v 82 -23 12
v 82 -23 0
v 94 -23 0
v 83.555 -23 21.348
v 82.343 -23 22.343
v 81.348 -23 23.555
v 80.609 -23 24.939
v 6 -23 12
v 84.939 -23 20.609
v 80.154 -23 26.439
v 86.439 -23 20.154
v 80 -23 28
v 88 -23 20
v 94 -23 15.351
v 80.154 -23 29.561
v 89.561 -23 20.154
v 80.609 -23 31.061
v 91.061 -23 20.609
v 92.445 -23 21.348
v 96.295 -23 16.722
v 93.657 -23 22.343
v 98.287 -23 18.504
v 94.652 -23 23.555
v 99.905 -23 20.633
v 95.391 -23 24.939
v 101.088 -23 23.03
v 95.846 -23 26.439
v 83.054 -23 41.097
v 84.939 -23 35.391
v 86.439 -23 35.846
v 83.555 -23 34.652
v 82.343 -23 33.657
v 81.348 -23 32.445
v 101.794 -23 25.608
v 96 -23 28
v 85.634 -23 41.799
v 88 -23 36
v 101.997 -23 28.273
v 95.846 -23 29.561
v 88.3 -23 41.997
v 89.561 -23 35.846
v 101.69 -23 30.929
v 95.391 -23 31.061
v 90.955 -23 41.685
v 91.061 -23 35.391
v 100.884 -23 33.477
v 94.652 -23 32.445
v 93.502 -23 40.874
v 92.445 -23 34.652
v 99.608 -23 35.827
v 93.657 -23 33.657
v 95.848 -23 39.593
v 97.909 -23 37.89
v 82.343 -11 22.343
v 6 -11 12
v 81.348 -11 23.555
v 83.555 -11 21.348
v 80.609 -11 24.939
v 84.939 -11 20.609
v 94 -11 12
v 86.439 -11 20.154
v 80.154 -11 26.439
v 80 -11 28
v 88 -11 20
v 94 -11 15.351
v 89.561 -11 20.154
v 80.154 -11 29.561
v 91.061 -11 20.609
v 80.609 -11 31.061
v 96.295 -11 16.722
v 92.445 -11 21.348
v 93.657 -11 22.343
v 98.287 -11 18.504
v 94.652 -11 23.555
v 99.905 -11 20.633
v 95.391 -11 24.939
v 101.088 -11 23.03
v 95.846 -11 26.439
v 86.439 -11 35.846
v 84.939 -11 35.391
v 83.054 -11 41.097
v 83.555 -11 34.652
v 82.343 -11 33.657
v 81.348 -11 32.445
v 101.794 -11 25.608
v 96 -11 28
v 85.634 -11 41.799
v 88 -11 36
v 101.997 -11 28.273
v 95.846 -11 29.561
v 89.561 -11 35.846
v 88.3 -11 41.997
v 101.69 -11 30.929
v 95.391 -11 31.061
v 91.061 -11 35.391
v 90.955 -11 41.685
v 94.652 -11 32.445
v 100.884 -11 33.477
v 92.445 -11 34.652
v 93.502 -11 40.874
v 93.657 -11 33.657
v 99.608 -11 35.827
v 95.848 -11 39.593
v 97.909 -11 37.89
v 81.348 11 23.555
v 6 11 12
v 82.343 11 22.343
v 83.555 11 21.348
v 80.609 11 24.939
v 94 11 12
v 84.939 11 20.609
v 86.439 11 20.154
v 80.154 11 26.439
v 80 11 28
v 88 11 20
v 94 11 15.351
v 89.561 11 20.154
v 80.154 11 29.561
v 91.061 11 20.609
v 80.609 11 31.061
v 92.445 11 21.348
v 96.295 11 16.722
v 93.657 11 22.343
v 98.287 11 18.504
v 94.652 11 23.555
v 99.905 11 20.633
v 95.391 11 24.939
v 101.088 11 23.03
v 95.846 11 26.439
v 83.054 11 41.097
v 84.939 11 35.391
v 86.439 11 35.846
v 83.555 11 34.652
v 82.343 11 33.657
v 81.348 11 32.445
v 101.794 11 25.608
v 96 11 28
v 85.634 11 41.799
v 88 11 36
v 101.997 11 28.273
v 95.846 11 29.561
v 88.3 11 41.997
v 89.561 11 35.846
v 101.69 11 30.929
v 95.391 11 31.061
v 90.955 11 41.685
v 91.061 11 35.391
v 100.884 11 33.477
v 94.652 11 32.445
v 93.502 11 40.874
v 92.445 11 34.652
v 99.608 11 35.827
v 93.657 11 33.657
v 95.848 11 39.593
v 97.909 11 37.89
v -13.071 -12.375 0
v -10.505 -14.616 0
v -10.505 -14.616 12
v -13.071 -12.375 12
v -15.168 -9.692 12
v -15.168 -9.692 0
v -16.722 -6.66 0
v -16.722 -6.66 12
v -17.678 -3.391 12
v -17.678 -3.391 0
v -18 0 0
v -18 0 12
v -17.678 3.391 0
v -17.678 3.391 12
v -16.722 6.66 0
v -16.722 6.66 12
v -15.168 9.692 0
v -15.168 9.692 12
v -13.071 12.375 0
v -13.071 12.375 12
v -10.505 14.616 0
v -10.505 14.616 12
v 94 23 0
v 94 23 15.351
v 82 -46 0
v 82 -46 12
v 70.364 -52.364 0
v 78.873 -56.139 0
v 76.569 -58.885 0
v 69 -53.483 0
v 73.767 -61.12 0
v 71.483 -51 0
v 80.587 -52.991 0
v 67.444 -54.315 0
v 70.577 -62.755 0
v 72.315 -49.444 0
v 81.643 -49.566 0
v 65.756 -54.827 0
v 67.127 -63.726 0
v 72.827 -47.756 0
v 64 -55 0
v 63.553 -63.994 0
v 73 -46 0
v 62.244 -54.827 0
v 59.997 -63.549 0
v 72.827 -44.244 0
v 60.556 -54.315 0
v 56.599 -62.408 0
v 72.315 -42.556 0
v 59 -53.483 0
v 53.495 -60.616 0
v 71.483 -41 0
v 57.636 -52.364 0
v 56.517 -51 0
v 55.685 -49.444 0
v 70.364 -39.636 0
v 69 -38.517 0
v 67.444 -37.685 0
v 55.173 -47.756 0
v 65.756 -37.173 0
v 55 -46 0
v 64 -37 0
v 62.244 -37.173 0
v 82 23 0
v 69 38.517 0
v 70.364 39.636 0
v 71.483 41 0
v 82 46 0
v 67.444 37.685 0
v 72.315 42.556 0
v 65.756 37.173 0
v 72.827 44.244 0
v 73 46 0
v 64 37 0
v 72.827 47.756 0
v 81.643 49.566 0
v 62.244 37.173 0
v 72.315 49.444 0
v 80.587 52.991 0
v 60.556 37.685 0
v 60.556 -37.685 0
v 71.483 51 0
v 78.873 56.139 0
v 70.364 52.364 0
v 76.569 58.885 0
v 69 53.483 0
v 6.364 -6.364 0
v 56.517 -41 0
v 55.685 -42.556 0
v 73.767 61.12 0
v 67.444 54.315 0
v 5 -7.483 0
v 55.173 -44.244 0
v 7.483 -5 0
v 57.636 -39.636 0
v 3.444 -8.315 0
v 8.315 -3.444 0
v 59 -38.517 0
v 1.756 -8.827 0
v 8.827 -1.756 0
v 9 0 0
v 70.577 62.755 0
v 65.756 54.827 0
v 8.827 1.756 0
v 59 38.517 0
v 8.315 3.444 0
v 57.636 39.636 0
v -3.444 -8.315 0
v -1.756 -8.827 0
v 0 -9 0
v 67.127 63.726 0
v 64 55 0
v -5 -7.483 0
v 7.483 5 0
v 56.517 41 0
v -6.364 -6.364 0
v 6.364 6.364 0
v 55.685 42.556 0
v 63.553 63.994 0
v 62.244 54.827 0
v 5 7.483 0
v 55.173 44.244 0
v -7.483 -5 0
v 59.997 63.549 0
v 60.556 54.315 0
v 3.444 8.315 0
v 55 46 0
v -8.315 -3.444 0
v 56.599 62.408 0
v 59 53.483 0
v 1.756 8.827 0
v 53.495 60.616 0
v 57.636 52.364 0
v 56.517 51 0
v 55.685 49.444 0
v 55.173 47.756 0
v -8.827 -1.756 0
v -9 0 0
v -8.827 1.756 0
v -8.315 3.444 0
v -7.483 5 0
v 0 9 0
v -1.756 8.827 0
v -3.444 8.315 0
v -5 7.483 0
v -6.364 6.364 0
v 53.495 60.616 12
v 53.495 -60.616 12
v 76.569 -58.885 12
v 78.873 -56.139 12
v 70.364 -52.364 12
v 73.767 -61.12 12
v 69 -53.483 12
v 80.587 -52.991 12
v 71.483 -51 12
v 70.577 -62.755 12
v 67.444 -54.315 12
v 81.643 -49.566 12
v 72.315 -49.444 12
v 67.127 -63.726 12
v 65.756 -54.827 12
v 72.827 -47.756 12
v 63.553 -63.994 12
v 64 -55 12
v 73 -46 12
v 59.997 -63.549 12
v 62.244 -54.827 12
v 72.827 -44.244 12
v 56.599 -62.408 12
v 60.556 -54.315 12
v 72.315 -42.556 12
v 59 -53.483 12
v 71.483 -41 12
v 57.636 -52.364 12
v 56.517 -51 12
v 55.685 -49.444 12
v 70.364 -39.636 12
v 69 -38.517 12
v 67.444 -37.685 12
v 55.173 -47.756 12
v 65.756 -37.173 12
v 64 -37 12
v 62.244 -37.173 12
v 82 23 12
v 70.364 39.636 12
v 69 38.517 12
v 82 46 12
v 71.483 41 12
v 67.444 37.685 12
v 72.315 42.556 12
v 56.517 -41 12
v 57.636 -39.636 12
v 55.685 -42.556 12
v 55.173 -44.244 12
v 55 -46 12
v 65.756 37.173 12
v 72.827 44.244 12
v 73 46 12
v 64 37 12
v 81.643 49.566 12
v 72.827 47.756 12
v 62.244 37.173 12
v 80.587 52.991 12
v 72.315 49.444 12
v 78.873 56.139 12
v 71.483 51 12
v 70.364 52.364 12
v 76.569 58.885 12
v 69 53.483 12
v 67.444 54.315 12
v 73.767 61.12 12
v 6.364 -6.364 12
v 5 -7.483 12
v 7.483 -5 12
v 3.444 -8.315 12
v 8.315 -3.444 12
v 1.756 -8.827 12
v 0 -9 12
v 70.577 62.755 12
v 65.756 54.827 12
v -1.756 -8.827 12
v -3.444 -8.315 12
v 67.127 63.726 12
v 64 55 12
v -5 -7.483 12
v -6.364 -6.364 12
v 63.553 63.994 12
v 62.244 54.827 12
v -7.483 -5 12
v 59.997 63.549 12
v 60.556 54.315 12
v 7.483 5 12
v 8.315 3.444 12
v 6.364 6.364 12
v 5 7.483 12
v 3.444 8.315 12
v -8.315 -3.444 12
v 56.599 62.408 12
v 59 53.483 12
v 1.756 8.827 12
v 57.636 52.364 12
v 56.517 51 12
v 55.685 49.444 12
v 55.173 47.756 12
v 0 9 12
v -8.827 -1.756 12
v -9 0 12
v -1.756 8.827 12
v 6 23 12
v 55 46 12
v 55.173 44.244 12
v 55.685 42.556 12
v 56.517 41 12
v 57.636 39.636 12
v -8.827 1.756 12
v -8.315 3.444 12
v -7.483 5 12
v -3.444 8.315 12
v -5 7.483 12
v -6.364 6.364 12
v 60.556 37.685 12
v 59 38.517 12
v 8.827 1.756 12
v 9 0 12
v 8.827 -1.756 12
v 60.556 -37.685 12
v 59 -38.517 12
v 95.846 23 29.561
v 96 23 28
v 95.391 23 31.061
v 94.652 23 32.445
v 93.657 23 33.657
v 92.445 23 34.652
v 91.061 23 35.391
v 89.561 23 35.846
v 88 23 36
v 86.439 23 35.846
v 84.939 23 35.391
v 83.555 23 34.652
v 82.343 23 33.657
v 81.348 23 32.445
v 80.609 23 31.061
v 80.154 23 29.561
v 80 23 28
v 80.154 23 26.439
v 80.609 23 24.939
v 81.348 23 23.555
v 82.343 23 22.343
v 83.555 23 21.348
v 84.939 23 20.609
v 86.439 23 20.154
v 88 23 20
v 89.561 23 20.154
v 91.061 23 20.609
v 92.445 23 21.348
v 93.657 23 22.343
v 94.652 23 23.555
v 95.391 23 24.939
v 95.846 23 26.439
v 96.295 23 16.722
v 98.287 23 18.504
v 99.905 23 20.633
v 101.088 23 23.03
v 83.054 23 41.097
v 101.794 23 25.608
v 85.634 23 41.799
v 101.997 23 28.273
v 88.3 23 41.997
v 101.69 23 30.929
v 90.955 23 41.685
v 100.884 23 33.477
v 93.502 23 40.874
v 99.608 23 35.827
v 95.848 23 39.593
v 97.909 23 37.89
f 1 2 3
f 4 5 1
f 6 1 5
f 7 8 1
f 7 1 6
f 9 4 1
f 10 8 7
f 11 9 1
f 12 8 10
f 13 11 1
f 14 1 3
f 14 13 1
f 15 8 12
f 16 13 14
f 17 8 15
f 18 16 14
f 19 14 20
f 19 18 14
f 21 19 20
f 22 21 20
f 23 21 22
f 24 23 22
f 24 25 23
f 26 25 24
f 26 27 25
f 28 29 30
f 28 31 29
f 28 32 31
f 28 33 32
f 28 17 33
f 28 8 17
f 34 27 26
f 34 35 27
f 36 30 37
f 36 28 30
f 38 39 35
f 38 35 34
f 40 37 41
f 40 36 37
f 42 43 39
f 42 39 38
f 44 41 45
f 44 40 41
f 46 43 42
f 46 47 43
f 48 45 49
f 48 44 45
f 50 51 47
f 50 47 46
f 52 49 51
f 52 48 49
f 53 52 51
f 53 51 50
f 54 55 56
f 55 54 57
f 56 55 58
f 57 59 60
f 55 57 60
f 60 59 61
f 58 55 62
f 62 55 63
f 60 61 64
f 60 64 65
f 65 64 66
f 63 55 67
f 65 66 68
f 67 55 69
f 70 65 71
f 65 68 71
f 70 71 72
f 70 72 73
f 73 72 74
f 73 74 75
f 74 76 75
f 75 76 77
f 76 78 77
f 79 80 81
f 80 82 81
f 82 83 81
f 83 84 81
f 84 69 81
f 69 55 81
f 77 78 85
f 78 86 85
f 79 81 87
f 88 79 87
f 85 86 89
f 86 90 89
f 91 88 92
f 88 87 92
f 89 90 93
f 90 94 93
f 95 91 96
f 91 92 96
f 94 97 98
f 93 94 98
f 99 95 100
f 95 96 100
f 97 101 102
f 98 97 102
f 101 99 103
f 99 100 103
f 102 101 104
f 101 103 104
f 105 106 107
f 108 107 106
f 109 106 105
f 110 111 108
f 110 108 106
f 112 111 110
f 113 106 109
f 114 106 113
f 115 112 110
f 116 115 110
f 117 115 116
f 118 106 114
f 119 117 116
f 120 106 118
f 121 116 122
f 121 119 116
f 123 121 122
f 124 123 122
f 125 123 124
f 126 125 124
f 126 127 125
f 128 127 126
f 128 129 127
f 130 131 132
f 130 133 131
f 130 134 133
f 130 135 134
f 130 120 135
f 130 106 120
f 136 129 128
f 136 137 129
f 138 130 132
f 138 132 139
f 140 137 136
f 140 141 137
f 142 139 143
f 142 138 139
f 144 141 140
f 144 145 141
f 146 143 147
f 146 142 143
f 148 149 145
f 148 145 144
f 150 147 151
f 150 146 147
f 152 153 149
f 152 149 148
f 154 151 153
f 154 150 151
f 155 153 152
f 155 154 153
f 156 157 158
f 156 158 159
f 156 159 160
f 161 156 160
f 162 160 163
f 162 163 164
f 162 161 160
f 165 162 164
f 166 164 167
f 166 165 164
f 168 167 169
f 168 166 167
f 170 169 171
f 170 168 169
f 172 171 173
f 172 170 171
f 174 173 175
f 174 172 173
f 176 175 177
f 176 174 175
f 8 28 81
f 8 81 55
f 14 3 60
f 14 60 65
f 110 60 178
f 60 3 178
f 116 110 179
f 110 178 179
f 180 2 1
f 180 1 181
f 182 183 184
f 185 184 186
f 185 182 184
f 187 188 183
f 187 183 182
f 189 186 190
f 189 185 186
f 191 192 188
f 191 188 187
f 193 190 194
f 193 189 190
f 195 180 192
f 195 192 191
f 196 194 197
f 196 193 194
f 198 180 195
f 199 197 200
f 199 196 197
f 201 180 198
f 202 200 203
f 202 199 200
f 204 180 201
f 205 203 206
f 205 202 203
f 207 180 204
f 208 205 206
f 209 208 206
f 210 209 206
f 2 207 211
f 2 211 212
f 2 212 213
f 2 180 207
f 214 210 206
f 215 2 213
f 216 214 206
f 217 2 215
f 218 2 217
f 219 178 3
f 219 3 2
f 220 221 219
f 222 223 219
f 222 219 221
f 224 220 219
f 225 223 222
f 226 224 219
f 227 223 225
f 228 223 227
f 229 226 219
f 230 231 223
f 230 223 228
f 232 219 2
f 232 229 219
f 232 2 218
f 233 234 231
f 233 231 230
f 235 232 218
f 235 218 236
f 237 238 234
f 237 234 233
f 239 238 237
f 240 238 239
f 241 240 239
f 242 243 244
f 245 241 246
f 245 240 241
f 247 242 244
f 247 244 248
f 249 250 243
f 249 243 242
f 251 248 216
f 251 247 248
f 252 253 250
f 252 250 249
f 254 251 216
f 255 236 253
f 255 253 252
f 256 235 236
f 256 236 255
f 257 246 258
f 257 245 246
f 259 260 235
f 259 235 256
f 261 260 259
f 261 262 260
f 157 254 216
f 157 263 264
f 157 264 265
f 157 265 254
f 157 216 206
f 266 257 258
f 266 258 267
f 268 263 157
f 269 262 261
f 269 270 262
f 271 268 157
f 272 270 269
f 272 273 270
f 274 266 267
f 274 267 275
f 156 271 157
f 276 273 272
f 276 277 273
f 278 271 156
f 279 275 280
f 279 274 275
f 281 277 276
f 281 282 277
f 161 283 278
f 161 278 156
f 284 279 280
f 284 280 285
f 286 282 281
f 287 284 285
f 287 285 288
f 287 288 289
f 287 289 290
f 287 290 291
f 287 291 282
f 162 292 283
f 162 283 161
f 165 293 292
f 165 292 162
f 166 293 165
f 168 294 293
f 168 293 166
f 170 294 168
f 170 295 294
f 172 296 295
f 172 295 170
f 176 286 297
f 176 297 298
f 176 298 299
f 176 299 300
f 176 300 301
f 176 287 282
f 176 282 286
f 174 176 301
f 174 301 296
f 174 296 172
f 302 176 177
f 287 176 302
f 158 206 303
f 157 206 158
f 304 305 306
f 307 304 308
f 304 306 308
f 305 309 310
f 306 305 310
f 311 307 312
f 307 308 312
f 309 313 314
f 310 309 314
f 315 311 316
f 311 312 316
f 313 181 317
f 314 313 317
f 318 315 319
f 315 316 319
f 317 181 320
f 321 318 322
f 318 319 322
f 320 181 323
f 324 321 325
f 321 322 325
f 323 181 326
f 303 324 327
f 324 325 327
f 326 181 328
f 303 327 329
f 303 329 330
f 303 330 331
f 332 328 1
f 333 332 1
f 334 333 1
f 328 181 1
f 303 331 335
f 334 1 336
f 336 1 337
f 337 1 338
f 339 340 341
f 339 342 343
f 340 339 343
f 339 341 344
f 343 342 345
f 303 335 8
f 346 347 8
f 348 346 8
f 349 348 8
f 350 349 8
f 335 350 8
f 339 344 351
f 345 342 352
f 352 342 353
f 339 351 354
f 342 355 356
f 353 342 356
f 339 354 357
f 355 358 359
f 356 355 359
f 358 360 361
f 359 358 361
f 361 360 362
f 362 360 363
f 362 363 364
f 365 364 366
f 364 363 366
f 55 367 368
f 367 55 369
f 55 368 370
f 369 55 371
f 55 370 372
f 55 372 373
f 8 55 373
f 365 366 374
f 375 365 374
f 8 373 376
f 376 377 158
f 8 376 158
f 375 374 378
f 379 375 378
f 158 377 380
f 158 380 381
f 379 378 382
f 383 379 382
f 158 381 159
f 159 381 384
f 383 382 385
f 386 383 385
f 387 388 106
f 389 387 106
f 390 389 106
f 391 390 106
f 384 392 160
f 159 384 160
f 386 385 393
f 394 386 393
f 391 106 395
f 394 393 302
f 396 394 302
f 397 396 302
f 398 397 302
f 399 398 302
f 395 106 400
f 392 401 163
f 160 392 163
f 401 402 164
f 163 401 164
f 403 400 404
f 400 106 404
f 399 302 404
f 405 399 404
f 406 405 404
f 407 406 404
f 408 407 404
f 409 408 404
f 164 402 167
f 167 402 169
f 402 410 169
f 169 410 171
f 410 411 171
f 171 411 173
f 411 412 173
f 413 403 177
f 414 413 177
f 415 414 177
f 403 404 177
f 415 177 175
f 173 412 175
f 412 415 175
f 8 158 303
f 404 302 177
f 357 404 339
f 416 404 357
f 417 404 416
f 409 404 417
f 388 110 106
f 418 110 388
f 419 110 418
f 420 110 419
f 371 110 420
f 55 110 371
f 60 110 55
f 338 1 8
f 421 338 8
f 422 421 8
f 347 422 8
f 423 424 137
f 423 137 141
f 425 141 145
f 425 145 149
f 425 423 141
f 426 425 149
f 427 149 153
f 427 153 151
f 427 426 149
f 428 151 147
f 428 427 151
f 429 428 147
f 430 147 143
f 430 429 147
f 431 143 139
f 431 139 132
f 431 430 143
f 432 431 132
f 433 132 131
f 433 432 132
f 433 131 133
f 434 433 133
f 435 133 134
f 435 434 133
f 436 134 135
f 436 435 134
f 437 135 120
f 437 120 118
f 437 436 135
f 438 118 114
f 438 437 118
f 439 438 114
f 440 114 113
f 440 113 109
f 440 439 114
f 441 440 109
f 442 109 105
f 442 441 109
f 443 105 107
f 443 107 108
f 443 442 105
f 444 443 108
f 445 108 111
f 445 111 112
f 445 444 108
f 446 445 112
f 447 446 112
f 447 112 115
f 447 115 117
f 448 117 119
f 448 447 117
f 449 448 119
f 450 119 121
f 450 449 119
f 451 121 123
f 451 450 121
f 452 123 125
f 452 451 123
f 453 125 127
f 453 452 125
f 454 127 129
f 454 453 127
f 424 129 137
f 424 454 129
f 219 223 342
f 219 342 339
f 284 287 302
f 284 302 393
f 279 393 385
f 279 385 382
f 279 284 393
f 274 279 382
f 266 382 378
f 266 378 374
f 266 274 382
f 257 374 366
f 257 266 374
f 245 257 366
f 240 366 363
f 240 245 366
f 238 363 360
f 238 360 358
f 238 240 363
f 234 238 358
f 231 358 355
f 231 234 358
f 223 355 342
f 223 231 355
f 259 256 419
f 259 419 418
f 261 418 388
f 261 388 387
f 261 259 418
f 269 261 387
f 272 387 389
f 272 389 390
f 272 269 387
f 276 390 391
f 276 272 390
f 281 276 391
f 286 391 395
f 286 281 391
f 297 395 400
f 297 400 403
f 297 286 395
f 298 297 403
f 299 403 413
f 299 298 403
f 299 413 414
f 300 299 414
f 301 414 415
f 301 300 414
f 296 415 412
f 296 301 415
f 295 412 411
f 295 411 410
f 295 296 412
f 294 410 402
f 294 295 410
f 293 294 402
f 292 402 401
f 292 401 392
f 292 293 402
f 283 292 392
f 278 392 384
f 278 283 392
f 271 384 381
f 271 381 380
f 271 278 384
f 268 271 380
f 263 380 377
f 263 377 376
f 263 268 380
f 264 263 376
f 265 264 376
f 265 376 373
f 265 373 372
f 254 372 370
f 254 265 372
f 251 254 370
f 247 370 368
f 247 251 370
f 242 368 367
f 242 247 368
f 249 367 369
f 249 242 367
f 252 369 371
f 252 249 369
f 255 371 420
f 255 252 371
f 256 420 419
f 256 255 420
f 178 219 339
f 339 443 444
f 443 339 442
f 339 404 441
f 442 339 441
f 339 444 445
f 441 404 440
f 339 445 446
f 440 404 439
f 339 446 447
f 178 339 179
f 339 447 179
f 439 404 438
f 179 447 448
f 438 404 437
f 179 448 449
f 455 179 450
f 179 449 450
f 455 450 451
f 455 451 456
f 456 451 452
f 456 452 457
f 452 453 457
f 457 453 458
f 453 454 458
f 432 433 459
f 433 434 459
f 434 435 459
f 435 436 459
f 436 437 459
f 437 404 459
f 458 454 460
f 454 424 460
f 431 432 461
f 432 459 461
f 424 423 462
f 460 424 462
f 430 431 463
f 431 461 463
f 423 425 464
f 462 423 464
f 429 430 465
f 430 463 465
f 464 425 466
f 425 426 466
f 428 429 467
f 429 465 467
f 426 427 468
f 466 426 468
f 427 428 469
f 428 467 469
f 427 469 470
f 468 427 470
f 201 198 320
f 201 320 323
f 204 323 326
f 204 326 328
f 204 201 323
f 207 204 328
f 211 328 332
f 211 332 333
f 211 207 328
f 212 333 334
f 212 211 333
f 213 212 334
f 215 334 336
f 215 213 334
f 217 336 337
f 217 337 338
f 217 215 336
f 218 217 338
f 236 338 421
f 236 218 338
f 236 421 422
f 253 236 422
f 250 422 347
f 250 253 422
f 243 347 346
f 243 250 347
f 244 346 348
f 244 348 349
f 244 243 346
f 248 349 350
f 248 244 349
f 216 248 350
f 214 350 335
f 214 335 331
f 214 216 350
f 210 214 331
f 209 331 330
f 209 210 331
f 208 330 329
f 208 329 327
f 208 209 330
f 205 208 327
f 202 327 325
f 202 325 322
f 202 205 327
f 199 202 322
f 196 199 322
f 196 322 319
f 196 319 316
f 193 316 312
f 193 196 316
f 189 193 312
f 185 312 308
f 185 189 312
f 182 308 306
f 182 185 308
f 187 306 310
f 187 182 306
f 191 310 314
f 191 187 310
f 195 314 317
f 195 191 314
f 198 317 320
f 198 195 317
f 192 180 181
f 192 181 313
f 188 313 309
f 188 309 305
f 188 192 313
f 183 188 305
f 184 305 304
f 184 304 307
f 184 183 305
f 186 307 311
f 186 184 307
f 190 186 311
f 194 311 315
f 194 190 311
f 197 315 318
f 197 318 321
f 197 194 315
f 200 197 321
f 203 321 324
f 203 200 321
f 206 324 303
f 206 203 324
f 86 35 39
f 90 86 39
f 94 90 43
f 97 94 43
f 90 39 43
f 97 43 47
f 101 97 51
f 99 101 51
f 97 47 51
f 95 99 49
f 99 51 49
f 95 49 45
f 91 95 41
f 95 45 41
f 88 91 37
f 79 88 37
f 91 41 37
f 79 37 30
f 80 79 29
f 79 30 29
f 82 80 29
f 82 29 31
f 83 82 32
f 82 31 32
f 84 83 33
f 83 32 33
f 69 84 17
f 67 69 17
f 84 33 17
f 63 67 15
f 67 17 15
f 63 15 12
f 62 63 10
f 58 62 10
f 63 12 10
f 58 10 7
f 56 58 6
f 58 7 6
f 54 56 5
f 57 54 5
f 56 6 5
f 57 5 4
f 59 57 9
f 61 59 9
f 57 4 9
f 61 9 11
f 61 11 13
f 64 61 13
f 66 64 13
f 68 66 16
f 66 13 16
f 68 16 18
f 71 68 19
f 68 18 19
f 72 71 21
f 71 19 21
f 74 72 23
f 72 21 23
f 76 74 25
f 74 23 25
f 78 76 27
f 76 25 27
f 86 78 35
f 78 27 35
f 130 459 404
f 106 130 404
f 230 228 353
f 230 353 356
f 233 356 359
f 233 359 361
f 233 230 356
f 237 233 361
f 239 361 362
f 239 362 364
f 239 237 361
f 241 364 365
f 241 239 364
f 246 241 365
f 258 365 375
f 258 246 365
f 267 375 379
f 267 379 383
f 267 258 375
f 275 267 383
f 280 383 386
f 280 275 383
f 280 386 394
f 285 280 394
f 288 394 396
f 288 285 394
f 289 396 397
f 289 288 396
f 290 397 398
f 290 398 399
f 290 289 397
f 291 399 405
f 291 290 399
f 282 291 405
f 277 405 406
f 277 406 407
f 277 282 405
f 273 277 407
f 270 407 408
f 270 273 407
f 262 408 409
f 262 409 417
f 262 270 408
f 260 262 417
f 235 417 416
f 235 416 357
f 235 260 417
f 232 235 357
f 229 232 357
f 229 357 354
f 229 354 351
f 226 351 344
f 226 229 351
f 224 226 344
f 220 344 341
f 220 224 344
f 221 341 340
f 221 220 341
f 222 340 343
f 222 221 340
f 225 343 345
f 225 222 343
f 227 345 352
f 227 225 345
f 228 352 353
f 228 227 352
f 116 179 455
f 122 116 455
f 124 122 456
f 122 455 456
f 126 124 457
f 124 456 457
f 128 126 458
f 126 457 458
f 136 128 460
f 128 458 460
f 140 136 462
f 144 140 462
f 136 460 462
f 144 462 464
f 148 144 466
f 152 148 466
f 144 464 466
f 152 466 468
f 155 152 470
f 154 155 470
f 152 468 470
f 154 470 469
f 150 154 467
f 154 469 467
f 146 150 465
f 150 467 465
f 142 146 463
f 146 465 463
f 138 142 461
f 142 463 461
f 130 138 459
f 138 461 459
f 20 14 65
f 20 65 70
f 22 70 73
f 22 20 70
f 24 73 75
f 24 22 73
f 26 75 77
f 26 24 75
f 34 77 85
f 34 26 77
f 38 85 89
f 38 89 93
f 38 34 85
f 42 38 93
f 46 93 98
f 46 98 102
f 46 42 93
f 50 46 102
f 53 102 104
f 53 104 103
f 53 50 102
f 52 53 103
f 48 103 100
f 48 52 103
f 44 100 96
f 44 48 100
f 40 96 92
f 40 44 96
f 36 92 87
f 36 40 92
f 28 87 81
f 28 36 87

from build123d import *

# Parameters (mm, degrees)
SKETCH1_R            = 9
BOSS_EXTRUDE1_DEPTH  = 12
SKETCH6_W            = 12
SKETCH6_H            = 46
BOSS_EXTRUDE5_DEPTH  = 12
SKETCH7_R            = 8
BOSS_EXTRUDE17_DEPTH = 12


with BuildPart() as part:
    # Sketch1 → Boss-Extrude1 (new body)
    with BuildSketch(Plane.XY):
        with BuildLine():
            Line((-10.505448867, 14.616276684), (53.494551133, 60.616276684))
            ThreePointArc((53.494551133, 60.616276684), (72.212853353, 62.017148304), (82, 46))
            Line((82, 46), (82, -46))
            ThreePointArc((82, -46), (72.212853353, -62.017148304), (53.494551133, -60.616276684))
            Line((53.494551133, -60.616276684), (-10.505448867, -14.616276684))
            ThreePointArc((-10.505448867, -14.616276684), (-18, 0), (-10.505448867, 14.616276684))
        make_face()
        Circle(SKETCH1_R, mode=Mode.SUBTRACT)
        with Locations((64, 46)):
            Circle(SKETCH1_R, mode=Mode.SUBTRACT)
        with Locations((64, -46)):
            Circle(SKETCH1_R, mode=Mode.SUBTRACT)
    extrude(amount=BOSS_EXTRUDE1_DEPTH)

    # Sketch6 → Boss-Extrude5 (add)
    with BuildSketch(Plane(origin=(82, 0, 0), x_dir=(0, 0, -1), z_dir=(1, 0, 0))):
        with Locations((-6, 0)):
            Rectangle(SKETCH6_W, SKETCH6_H)
    extrude(amount=BOSS_EXTRUDE5_DEPTH)

    # Sketch7 → Boss-Extrude17 (add)
    with BuildSketch(Plane.XZ.offset(23)):
        with BuildLine():
            Line((6, 12), (94, 12))
            Line((94, 12), (94, 15.350889359))
            ThreePointArc((94, 15.350889359), (100.88398553, 33.477491841), (83.054187792, 41.097287567))
            Line((83.054187792, 41.097287567), (6, 12))
        make_face()
        with Locations((88, 28)):
            Circle(SKETCH7_R, mode=Mode.SUBTRACT)
    boss_extrude17 = extrude(amount=-BOSS_EXTRUDE17_DEPTH)

    # Mirror2: Boss-Extrude17 across plane
    add(boss_extrude17.mirror(Plane.ZX))


solid = part.part
